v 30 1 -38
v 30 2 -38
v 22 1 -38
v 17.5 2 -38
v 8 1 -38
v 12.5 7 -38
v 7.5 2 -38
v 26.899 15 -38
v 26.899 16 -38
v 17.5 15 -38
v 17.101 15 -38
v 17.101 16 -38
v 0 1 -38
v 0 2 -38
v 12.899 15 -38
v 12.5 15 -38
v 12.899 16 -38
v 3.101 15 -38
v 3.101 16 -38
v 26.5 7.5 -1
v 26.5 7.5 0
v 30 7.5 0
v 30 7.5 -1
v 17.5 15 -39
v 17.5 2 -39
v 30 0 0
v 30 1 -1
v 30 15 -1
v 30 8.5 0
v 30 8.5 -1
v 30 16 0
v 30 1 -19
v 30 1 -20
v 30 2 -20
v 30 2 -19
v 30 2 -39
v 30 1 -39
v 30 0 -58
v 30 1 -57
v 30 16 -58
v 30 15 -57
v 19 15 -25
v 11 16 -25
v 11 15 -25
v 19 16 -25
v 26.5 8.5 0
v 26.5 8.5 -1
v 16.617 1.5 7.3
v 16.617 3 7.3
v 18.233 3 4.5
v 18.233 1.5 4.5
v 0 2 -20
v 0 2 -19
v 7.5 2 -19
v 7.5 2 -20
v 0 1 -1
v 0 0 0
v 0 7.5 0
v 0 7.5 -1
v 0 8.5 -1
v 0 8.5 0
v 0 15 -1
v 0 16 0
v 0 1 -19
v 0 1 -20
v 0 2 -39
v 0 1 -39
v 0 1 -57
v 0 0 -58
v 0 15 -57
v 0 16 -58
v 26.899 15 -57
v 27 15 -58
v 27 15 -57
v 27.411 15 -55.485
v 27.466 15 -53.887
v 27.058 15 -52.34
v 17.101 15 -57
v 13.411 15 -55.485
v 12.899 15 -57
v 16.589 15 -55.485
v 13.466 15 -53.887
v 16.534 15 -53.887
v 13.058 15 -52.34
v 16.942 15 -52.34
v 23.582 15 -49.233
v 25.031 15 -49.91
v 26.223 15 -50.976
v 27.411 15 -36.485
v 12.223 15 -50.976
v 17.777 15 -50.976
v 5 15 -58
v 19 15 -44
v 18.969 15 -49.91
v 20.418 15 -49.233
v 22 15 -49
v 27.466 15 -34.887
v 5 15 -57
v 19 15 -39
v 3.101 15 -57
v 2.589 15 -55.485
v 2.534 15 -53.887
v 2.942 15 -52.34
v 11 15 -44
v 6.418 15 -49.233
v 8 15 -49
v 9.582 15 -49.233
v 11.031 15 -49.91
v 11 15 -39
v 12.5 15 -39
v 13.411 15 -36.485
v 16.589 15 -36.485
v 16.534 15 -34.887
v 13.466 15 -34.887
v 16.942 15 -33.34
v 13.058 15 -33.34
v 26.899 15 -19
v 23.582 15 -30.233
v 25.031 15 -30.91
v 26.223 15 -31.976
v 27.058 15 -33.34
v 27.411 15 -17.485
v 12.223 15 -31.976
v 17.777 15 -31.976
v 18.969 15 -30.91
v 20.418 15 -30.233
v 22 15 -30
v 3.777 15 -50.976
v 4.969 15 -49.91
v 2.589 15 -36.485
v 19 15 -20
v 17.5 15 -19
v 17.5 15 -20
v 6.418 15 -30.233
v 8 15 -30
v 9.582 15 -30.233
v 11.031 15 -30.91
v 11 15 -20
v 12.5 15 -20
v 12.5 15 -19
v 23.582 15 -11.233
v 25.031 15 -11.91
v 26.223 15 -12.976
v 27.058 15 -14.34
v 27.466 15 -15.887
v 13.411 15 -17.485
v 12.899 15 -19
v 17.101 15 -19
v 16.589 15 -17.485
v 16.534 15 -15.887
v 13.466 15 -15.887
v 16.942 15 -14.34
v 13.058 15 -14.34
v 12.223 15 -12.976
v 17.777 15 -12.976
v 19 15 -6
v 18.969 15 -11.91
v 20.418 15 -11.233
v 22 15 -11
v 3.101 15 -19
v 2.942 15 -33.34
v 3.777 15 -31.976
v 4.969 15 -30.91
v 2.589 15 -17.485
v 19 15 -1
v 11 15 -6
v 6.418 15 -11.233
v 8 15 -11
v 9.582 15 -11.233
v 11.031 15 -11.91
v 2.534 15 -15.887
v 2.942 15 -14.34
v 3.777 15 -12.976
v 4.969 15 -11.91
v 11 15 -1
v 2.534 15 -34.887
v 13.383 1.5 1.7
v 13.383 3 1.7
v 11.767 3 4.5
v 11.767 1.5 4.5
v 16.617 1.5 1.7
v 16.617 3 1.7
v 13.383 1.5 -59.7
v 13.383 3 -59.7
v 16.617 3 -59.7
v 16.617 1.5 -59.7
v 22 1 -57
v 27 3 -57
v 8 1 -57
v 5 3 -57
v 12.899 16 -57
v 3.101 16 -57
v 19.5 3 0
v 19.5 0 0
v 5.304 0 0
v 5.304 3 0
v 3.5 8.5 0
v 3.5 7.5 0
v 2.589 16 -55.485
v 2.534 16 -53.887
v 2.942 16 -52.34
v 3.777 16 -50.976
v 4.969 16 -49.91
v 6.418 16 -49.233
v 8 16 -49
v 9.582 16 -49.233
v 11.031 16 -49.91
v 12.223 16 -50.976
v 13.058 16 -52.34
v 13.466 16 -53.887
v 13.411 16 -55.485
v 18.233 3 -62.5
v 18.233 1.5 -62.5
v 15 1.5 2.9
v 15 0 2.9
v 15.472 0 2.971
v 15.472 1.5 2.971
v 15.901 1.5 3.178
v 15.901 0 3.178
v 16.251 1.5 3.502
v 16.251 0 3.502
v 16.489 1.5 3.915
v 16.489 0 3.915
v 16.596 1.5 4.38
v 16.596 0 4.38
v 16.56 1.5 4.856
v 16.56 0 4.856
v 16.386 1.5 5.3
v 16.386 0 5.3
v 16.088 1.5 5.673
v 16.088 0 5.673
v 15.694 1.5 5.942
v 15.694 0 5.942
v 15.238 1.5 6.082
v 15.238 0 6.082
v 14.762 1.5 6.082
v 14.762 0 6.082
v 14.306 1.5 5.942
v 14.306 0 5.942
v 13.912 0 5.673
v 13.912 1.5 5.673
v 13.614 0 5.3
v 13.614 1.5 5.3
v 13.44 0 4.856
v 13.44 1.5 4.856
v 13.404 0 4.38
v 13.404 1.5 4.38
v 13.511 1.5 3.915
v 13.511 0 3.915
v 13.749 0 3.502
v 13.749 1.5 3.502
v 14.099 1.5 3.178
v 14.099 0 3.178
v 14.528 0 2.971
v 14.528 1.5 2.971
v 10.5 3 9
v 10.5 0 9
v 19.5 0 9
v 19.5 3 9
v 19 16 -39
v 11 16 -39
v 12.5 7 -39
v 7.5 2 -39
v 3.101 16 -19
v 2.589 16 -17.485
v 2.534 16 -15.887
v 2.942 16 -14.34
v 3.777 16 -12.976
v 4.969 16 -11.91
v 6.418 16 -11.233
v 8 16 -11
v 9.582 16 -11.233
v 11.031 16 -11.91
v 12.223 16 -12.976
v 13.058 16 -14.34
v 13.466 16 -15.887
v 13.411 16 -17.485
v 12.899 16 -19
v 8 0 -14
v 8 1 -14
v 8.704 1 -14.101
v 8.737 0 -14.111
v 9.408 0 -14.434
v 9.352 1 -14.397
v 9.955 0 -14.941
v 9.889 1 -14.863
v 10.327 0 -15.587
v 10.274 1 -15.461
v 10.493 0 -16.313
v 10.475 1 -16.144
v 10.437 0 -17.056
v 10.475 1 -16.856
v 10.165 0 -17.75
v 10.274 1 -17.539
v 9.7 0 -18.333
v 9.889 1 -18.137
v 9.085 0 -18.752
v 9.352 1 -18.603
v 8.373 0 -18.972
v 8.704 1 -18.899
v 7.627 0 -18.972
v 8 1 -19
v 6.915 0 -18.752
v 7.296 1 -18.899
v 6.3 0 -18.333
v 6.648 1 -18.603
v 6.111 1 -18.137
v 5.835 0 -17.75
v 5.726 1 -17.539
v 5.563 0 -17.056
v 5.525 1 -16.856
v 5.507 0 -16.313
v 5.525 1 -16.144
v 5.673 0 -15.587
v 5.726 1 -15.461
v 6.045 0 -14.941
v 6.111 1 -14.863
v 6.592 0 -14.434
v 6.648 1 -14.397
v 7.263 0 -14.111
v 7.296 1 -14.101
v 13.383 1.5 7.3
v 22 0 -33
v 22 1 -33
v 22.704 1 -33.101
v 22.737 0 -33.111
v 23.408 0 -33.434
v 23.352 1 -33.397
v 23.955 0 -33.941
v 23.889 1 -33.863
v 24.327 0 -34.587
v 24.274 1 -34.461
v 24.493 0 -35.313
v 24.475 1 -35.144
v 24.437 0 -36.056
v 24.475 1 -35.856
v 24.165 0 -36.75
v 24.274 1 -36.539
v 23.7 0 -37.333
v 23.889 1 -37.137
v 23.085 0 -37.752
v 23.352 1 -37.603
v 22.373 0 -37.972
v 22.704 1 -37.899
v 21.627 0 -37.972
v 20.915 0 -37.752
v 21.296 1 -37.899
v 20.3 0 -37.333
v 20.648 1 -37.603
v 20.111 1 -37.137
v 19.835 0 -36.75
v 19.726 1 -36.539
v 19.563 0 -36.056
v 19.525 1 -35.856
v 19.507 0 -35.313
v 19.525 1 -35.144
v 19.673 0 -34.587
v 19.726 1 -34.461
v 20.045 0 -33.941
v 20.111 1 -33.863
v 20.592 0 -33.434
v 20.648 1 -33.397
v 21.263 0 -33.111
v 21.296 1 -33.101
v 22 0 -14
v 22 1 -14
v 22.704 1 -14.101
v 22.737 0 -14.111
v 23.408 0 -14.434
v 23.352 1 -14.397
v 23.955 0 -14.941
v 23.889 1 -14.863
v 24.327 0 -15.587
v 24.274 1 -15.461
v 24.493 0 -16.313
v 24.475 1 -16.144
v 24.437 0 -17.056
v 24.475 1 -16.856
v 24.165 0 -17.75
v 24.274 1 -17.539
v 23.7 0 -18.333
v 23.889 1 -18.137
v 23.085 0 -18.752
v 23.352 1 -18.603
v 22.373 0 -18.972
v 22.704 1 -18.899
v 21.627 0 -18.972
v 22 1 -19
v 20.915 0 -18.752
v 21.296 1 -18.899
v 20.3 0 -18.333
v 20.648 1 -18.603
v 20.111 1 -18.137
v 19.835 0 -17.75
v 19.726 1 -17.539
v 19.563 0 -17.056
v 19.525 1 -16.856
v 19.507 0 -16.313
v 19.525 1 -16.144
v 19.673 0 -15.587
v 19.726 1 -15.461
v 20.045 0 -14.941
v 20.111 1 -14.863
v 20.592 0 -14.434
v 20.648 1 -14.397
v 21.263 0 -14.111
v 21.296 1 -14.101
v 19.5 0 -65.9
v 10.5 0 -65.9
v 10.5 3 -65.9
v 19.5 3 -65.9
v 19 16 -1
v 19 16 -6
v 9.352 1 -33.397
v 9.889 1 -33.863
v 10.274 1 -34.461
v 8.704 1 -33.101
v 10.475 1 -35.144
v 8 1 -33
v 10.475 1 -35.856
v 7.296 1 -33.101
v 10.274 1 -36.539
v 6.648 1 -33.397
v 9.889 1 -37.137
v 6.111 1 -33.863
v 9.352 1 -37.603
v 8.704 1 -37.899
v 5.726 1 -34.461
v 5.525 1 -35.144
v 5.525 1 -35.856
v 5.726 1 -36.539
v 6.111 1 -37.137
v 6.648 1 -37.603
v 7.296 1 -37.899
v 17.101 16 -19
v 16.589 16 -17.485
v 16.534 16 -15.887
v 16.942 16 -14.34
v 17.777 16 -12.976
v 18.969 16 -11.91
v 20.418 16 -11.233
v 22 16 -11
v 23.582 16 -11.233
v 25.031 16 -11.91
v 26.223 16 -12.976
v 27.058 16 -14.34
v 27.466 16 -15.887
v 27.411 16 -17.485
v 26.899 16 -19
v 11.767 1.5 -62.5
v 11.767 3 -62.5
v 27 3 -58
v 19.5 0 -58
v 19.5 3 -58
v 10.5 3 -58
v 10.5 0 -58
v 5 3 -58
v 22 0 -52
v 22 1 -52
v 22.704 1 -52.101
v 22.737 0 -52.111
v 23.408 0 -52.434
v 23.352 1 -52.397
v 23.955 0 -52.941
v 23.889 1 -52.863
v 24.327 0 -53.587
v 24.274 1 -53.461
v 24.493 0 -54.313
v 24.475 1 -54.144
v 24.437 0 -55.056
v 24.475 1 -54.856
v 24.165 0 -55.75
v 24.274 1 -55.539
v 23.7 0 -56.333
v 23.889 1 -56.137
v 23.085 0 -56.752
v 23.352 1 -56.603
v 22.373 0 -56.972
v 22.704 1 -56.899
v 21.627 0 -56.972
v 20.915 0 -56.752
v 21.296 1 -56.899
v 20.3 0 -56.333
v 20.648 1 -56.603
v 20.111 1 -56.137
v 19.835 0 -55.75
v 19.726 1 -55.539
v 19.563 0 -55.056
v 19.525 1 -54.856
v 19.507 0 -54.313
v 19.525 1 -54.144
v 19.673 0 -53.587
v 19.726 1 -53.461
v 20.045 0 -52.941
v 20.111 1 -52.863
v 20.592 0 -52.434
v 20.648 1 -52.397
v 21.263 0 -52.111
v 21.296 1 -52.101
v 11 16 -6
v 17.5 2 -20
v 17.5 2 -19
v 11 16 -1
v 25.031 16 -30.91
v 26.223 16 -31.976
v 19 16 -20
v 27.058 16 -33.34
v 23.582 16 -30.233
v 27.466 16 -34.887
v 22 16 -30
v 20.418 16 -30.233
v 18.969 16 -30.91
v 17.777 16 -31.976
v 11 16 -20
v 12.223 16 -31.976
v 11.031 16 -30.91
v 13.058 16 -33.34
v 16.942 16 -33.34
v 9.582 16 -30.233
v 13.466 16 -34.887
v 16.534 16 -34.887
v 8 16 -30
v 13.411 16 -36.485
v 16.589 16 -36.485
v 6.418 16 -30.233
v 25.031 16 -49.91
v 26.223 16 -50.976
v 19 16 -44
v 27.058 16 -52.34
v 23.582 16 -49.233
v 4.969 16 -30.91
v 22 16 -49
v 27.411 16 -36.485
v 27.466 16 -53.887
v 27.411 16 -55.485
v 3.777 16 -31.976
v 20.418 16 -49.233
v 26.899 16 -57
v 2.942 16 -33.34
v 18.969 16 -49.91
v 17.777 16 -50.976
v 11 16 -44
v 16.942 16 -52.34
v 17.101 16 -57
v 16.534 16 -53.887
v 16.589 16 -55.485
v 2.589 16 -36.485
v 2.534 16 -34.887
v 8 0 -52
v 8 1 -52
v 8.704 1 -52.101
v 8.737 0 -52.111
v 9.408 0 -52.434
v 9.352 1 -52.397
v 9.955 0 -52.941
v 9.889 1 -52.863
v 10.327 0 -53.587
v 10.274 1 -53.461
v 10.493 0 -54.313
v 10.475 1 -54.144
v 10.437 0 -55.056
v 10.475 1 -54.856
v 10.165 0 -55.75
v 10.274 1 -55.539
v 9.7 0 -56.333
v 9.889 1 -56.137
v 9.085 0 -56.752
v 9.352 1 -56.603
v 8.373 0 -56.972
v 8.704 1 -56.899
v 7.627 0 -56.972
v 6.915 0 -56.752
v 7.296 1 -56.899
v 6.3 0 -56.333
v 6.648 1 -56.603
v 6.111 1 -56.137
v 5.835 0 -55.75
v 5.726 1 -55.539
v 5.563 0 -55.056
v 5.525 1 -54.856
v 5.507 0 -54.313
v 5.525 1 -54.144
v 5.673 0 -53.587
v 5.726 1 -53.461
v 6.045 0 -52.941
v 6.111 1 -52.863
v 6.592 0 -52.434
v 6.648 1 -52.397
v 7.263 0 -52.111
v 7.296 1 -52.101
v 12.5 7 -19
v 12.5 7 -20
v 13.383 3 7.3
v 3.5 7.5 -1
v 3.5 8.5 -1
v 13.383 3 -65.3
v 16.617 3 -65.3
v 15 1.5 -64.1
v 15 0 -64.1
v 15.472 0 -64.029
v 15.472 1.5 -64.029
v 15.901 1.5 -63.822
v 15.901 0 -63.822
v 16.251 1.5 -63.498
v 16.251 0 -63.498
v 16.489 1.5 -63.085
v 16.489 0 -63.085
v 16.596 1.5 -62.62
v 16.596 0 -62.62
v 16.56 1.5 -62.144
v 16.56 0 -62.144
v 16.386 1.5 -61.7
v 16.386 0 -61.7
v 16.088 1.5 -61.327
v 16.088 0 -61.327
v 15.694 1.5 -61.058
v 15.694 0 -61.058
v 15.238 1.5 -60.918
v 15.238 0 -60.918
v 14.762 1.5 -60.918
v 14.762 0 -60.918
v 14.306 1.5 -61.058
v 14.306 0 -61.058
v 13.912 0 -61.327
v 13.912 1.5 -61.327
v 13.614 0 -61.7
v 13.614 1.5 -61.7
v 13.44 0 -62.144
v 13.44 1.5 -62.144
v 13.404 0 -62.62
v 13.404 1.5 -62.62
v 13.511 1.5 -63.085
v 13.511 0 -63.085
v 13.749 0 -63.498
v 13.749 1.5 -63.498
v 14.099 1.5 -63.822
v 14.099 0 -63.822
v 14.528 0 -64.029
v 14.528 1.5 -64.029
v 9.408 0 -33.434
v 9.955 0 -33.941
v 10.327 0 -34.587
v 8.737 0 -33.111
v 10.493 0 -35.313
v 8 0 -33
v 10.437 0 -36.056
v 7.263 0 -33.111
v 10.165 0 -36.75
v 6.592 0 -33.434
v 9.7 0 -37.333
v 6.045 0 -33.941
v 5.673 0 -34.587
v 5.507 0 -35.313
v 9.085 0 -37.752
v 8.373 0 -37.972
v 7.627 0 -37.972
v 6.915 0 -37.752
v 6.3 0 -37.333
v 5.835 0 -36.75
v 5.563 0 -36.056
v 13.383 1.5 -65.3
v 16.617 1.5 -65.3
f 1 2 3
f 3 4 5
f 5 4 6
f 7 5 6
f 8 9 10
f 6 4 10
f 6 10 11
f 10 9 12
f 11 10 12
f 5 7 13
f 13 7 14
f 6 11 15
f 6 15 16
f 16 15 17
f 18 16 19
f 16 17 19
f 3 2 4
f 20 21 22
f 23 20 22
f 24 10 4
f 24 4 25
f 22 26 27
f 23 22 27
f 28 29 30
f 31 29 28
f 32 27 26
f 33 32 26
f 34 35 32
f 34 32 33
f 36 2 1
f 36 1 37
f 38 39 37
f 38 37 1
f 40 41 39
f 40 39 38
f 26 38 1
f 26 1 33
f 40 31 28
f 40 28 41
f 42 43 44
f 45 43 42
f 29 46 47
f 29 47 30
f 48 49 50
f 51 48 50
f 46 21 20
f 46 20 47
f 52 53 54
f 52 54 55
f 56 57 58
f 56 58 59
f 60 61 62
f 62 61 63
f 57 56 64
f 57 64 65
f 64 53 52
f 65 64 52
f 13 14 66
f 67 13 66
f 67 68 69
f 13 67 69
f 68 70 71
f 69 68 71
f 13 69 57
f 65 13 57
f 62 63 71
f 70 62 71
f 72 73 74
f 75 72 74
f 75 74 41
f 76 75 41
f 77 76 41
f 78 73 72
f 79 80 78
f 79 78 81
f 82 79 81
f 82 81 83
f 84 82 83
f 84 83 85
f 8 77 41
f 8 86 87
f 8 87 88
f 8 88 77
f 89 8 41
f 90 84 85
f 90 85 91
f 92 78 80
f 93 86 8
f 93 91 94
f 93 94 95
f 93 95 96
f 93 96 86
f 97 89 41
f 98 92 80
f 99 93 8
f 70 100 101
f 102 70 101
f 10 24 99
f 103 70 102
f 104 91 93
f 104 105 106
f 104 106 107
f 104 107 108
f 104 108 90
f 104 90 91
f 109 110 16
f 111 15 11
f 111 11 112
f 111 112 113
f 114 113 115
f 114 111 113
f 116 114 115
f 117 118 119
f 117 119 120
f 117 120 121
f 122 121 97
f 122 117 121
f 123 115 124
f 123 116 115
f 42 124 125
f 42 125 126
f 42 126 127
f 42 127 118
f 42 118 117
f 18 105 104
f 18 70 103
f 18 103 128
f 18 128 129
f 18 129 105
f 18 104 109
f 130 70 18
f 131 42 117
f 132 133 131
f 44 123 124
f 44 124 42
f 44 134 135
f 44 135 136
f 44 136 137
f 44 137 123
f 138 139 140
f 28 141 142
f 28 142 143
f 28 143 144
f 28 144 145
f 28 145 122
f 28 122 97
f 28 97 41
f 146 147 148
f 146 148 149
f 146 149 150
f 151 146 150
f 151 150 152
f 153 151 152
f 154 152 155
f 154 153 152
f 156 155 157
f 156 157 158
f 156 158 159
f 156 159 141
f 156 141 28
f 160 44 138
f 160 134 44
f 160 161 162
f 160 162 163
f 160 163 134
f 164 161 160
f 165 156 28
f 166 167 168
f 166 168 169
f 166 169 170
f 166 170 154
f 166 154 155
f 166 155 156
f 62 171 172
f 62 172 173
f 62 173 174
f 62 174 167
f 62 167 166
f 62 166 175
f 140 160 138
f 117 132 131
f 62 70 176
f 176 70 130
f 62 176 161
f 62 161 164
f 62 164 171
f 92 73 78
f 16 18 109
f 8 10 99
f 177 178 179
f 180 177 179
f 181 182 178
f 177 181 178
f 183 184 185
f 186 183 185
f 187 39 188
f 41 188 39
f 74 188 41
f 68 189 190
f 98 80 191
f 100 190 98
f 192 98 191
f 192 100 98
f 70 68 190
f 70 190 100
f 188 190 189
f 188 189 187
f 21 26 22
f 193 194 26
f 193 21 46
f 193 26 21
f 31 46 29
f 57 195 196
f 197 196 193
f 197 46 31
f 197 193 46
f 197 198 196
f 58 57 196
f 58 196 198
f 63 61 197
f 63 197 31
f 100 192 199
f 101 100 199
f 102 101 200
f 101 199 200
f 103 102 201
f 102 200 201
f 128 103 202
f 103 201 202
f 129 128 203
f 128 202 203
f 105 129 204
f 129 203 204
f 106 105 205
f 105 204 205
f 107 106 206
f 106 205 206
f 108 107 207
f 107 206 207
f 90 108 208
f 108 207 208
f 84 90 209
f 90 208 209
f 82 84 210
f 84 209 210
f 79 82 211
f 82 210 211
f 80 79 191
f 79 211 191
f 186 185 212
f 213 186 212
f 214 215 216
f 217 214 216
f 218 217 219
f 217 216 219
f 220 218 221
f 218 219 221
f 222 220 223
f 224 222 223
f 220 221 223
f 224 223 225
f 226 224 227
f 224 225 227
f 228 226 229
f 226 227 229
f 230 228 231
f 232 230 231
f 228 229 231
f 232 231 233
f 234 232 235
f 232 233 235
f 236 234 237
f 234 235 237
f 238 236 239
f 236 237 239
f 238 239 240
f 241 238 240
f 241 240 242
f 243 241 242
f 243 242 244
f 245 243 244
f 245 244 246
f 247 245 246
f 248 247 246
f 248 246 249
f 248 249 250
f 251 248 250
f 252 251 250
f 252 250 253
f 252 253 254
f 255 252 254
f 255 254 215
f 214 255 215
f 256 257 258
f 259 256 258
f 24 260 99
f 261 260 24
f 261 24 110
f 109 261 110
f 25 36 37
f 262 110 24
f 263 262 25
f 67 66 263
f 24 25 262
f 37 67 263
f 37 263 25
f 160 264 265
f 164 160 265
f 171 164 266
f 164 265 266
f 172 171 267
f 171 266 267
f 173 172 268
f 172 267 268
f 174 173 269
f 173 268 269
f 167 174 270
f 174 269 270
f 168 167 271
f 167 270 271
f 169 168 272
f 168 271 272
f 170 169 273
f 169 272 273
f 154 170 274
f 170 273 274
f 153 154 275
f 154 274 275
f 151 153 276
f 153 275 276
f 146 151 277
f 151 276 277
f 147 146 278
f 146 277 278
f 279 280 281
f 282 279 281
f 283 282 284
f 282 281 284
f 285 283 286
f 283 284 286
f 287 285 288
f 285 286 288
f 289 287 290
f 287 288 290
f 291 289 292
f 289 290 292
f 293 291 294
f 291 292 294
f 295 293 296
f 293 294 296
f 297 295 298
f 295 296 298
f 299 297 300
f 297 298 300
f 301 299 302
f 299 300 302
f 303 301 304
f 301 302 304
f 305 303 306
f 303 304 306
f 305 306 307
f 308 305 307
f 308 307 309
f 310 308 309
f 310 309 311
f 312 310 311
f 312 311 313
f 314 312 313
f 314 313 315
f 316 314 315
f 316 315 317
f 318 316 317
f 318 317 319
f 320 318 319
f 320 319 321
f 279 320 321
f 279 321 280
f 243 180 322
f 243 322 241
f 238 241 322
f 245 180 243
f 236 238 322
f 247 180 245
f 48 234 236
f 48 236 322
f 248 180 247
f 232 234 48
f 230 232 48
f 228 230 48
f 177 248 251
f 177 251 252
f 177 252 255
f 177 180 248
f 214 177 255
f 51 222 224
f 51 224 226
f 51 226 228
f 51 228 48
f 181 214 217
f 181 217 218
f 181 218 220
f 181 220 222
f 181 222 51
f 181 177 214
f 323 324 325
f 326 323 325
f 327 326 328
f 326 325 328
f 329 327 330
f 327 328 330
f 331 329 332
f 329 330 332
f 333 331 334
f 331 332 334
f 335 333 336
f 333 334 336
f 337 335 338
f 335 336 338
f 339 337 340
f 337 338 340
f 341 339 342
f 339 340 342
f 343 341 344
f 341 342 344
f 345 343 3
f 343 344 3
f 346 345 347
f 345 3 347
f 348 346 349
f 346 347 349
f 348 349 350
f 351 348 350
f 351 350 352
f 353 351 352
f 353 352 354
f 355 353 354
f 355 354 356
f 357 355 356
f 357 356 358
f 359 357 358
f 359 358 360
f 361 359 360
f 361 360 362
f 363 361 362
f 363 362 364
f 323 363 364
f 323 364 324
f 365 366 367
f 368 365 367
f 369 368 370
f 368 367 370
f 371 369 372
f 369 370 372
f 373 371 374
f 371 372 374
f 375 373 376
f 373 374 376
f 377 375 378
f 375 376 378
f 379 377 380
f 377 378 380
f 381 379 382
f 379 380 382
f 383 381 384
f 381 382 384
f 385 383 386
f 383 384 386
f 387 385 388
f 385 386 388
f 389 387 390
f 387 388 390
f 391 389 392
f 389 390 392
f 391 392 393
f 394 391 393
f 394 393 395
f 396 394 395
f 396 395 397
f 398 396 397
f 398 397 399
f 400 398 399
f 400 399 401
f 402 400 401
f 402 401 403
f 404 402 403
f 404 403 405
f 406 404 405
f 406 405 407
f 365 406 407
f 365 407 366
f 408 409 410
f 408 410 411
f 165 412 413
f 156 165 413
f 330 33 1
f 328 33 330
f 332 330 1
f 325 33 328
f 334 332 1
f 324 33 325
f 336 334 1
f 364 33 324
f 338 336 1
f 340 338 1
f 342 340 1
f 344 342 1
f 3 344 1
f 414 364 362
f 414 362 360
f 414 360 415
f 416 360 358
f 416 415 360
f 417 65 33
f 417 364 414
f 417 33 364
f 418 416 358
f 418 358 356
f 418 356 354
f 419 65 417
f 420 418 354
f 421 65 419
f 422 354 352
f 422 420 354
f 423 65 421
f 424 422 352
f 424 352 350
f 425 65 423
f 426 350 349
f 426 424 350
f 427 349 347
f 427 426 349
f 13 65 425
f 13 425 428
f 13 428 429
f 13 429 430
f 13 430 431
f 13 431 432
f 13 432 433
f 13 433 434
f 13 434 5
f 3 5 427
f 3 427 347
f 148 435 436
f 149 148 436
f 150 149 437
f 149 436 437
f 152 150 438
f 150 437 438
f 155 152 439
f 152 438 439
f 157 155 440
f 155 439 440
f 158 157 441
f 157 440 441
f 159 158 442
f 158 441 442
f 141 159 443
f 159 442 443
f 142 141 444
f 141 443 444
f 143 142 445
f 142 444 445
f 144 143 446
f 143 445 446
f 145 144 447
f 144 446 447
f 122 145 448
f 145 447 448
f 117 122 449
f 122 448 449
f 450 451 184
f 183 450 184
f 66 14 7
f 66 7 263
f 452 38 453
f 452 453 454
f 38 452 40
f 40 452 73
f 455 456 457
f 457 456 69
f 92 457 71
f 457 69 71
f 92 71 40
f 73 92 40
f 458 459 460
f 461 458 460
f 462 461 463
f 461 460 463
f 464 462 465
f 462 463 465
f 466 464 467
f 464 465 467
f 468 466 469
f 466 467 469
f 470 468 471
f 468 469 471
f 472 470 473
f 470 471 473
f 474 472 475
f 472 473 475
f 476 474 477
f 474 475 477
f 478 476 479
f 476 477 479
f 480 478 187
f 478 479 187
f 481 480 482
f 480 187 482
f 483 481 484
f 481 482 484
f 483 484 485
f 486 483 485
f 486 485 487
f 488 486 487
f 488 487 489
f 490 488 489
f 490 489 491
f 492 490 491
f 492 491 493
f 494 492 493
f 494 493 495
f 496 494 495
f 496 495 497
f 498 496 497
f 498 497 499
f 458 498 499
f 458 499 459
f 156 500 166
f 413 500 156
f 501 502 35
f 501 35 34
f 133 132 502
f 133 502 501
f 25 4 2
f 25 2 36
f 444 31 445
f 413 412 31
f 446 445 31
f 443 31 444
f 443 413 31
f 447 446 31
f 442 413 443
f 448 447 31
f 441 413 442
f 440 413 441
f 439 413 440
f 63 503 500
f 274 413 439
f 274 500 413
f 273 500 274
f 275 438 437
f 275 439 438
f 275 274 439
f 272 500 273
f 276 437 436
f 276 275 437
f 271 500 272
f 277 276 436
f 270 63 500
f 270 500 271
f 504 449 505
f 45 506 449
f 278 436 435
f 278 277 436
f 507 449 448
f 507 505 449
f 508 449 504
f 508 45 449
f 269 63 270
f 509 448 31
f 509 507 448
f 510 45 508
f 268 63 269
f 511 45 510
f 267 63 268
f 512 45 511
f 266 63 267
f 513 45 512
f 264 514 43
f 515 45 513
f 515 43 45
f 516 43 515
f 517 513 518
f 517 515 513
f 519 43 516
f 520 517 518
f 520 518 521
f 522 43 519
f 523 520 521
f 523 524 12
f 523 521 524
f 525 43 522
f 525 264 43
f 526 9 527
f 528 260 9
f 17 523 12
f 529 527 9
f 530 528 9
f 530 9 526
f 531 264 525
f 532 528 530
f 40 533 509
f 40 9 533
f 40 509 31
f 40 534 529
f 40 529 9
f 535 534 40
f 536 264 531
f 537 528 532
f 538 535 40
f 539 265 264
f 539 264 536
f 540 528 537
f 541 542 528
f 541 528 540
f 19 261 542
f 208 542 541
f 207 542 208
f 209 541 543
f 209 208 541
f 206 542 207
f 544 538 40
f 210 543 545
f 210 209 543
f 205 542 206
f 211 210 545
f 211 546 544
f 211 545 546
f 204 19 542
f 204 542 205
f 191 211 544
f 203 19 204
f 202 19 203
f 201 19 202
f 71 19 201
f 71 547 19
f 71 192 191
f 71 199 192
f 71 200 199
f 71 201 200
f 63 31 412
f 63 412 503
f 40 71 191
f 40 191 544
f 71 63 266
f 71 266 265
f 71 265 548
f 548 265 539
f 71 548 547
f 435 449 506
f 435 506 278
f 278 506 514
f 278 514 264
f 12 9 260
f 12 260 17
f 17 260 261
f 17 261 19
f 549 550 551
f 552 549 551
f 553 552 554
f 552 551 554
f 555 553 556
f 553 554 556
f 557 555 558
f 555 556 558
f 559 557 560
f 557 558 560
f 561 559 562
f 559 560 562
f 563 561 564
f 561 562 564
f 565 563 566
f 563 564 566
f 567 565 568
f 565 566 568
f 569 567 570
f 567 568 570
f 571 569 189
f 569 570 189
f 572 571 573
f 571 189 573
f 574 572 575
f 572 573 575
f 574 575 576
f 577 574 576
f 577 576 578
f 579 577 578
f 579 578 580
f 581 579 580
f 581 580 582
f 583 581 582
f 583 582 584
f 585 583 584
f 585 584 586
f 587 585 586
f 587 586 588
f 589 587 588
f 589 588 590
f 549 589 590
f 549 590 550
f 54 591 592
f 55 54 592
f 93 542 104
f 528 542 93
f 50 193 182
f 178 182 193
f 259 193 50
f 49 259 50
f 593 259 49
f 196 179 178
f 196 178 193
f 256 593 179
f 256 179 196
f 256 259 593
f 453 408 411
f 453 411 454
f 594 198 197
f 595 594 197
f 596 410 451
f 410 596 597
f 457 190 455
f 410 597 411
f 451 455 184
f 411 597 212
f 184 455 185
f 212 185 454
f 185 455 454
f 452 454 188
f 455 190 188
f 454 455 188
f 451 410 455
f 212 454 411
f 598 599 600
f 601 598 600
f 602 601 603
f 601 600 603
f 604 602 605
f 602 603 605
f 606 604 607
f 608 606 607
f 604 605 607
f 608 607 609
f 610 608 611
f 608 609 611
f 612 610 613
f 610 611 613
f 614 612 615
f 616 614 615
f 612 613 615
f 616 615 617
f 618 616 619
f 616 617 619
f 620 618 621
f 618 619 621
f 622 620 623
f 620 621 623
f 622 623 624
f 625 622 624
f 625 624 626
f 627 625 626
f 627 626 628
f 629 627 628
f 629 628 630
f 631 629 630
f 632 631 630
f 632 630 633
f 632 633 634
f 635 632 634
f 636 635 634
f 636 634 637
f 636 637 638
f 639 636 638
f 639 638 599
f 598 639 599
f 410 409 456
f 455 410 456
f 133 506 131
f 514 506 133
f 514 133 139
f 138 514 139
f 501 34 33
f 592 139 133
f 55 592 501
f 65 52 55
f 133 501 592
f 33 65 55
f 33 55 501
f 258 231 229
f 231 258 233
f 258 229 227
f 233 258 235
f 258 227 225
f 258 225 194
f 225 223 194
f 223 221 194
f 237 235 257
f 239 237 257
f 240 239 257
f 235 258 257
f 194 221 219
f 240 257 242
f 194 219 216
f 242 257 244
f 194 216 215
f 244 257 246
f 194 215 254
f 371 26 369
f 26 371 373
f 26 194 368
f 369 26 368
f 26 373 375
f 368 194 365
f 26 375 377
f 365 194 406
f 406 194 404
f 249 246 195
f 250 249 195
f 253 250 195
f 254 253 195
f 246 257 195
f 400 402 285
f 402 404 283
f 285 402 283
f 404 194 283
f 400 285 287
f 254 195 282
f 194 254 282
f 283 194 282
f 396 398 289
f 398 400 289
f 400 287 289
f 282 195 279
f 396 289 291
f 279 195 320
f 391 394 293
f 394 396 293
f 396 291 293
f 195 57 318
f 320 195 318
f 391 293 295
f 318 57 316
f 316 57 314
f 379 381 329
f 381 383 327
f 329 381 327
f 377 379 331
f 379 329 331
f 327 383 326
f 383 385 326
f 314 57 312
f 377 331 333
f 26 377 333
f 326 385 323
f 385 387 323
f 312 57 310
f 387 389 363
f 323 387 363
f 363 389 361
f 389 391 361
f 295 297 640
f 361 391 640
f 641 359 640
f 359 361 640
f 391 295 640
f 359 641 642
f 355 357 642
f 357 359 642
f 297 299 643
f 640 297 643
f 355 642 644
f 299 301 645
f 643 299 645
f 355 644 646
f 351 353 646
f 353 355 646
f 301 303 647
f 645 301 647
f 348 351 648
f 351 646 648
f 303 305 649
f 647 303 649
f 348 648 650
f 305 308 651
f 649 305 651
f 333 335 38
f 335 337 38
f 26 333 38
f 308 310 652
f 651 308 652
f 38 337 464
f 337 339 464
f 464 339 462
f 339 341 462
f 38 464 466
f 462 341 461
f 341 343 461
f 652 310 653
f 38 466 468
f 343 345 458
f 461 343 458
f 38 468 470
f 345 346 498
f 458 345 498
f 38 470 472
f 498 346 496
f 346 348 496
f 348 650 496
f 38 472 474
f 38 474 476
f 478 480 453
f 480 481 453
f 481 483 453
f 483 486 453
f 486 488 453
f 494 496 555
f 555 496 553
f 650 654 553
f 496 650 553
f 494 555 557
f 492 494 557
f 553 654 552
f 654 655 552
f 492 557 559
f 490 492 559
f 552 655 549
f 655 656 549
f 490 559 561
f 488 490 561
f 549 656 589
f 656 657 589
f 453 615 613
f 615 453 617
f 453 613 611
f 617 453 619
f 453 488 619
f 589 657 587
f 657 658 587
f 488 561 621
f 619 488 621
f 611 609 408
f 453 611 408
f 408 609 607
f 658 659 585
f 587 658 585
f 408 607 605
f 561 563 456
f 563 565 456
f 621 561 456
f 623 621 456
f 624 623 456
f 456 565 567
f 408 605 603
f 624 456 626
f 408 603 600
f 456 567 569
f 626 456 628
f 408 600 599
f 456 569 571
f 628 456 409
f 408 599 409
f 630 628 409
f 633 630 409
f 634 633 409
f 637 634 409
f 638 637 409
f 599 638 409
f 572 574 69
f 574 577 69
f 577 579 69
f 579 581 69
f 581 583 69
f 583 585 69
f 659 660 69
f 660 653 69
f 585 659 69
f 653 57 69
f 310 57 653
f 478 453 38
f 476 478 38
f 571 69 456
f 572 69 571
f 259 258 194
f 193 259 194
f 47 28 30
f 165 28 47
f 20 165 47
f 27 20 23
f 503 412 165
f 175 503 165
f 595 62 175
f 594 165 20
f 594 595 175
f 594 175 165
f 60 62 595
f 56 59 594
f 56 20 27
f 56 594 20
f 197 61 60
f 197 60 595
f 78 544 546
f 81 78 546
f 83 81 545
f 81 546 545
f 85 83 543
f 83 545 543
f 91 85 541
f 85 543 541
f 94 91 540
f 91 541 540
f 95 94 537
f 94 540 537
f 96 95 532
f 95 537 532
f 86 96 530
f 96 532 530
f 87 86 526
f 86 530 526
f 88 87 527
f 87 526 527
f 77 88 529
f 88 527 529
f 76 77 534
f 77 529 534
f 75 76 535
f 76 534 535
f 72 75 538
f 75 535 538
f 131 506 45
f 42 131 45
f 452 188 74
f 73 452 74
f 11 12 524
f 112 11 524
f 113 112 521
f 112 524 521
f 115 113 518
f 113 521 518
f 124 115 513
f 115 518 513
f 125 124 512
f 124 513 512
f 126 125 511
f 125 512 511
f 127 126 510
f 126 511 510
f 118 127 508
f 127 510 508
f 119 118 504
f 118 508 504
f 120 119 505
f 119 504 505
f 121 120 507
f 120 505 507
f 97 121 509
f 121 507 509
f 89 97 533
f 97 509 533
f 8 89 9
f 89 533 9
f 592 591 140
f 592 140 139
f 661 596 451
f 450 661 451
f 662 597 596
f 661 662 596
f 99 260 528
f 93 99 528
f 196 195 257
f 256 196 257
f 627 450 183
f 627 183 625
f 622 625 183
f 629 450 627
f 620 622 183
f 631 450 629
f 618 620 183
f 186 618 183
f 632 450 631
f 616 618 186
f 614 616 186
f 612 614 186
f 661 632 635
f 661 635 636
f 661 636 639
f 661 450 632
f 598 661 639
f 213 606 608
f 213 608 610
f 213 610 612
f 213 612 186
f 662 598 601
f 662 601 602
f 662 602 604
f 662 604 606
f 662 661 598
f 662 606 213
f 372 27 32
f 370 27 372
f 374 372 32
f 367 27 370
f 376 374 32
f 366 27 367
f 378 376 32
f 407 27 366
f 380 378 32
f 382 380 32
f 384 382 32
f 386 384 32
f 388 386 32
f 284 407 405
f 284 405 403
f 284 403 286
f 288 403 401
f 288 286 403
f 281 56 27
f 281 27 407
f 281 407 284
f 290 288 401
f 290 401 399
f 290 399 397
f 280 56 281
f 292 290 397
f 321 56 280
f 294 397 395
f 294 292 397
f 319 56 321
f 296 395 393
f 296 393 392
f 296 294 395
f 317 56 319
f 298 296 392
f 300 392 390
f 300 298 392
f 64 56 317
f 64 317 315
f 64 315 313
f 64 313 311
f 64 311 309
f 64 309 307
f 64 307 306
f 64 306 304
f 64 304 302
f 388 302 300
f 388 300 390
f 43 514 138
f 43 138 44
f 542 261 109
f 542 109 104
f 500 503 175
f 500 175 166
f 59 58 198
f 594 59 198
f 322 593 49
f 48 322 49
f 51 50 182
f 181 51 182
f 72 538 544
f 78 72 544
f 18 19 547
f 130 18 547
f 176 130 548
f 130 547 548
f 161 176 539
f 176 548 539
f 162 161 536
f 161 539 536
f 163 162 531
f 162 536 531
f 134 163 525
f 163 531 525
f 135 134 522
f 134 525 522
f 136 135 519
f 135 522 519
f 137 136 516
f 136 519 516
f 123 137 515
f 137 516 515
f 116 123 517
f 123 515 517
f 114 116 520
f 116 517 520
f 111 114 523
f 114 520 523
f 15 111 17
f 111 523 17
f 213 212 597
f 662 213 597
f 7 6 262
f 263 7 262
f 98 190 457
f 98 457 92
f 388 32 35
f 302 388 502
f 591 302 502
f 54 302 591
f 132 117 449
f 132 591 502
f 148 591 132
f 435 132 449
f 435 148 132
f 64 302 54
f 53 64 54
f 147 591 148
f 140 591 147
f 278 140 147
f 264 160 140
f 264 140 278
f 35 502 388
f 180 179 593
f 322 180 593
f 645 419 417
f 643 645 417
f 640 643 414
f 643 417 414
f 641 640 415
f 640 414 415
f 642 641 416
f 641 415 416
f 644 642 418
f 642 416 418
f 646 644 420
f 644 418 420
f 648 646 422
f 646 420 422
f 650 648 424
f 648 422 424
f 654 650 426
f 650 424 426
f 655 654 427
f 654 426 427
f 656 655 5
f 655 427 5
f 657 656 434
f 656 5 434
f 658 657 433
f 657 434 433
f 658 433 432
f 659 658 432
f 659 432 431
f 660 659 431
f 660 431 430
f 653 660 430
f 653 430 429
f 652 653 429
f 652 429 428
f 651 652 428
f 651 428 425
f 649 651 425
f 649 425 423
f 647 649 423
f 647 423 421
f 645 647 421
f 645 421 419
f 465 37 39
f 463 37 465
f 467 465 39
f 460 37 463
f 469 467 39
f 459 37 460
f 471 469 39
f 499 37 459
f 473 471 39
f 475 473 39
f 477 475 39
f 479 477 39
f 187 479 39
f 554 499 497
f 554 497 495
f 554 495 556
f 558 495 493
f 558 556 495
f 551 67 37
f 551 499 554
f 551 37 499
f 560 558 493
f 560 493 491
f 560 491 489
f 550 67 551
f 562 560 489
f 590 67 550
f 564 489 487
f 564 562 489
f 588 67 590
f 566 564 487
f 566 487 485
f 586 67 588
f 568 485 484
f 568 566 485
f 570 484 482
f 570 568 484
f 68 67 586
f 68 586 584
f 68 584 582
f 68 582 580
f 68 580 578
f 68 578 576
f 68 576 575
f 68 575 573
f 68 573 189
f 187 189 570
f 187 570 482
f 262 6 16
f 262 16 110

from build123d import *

# Parameters (mm, degrees)
SKETCH3_W           = 58
SKETCH3_H           = 16
BOSS_EXTRUDE2_DEPTH = 30
CUT_EXTRUDE2_REACH  = 3
SKETCH4_R           = 2.5
CUT_EXTRUDE6_REACH  = 3
SKETCH7_W           = 22
SKETCH7_H           = 12
BOSS_EXTRUDE4_REACH = 16
SKETCH9_W           = 5
SKETCH9_H           = 1
CHAMFER1_SIZE       = 5
SKETCH10_R          = 1.6
SKETCH10_W          = 9
SKETCH10_H          = 9
BOSS_EXTRUDE5_DEPTH = 3
CUT_EXTRUDE8_DEPTH  = 1.5
CUT_EXTRUDE9_REACH  = 69
SKETCH12_W          = 3.5
SKETCH12_H          = 1
CUT_EXTRUDE10_REACH = 18
SKETCH13_W          = 9
SKETCH13_H          = 1.1
CUT_EXTRUDE12_REACH = 18
SKETCH14_W          = 8
SKETCH14_H          = 5


with BuildPart() as part:
    # Sketch3 → Boss-Extrude2 (new body)
    with BuildSketch(Plane(origin=(0, 0, 0), x_dir=(0, 0, -1), z_dir=(1, 0, 0))):
        with Locations((29, 8)):
            Rectangle(SKETCH3_W, SKETCH3_H)
        Polygon((1, 1), (19, 1), (19, 2), (20, 2), (20, 1), (38, 1), (38, 2), (39, 2), (39, 1), (57, 1), (57, 15), (1, 15), align=None, mode=Mode.SUBTRACT)
    extrude(amount=BOSS_EXTRUDE2_DEPTH)

    # Sketch4 → Cut-Extrude2 (cut, up to next)
    with BuildSketch(Plane(origin=(0, 1, 0), x_dir=(1, 0, 0), z_dir=(0, 1, 0)), mode=Mode.PRIVATE) as cut_extrude2_sk1:
        with Locations(Location((22, 54.5, 0), (0, 0, 270))):  # turned: the seam where the file's is
            Circle(SKETCH4_R)
    cut_extrude2_tool1 = extrude(cut_extrude2_sk1.sketch, amount=-CUT_EXTRUDE2_REACH, mode=Mode.PRIVATE) & part.part
    add(cut_extrude2_tool1.solids().sort_by_distance((22, 1, -54.5))[0], mode=Mode.SUBTRACT)
    # Sketch4 → Cut-Extrude2 (cut, up to next)
    with BuildSketch(Plane(origin=(0, 1, 0), x_dir=(1, 0, 0), z_dir=(0, 1, 0)), mode=Mode.PRIVATE) as cut_extrude2_sk2:
        with Locations(Location((8, 54.5, 0), (0, 0, 270))):  # turned: the seam where the file's is
            Circle(SKETCH4_R)
    cut_extrude2_tool2 = extrude(cut_extrude2_sk2.sketch, amount=-CUT_EXTRUDE2_REACH, mode=Mode.PRIVATE) & part.part
    add(cut_extrude2_tool2.solids().sort_by_distance((8, 1, -54.5))[0], mode=Mode.SUBTRACT)
    # Sketch4 → Cut-Extrude2 (cut, up to next)
    with BuildSketch(Plane(origin=(0, 1, 0), x_dir=(1, 0, 0), z_dir=(0, 1, 0)), mode=Mode.PRIVATE) as cut_extrude2_sk3:
        with Locations(Location((8, 35.5, 0), (0, 0, 270))):  # turned: the seam where the file's is
            Circle(SKETCH4_R)
    cut_extrude2_tool3 = extrude(cut_extrude2_sk3.sketch, amount=-CUT_EXTRUDE2_REACH, mode=Mode.PRIVATE) & part.part
    add(cut_extrude2_tool3.solids().sort_by_distance((8, 1, -35.5))[0], mode=Mode.SUBTRACT)
    # Sketch4 → Cut-Extrude2 (cut, up to next)
    with BuildSketch(Plane(origin=(0, 1, 0), x_dir=(1, 0, 0), z_dir=(0, 1, 0)), mode=Mode.PRIVATE) as cut_extrude2_sk4:
        with Locations(Location((22, 35.5, 0), (0, 0, 270))):  # turned: the seam where the file's is
            Circle(SKETCH4_R)
    cut_extrude2_tool4 = extrude(cut_extrude2_sk4.sketch, amount=-CUT_EXTRUDE2_REACH, mode=Mode.PRIVATE) & part.part
    add(cut_extrude2_tool4.solids().sort_by_distance((22, 1, -35.5))[0], mode=Mode.SUBTRACT)
    # Sketch4 → Cut-Extrude2 (cut, up to next)
    with BuildSketch(Plane(origin=(0, 1, 0), x_dir=(1, 0, 0), z_dir=(0, 1, 0)), mode=Mode.PRIVATE) as cut_extrude2_sk5:
        with Locations(Location((8, 16.5, 0), (0, 0, 270))):  # turned: the seam where the file's is
            Circle(SKETCH4_R)
    cut_extrude2_tool5 = extrude(cut_extrude2_sk5.sketch, amount=-CUT_EXTRUDE2_REACH, mode=Mode.PRIVATE) & part.part
    add(cut_extrude2_tool5.solids().sort_by_distance((8, 1, -16.5))[0], mode=Mode.SUBTRACT)
    # Sketch4 → Cut-Extrude2 (cut, up to next)
    with BuildSketch(Plane(origin=(0, 1, 0), x_dir=(1, 0, 0), z_dir=(0, 1, 0)), mode=Mode.PRIVATE) as cut_extrude2_sk6:
        with Locations(Location((22, 16.5, 0), (0, 0, 270))):  # turned: the seam where the file's is
            Circle(SKETCH4_R)
    cut_extrude2_tool6 = extrude(cut_extrude2_sk6.sketch, amount=-CUT_EXTRUDE2_REACH, mode=Mode.PRIVATE) & part.part
    add(cut_extrude2_tool6.solids().sort_by_distance((22, 1, -16.5))[0], mode=Mode.SUBTRACT)

    # Sketch7 → Cut-Extrude6 (cut, up to next)
    with BuildSketch(Plane.XY.offset(-57), mode=Mode.PRIVATE) as cut_extrude6_sk1:
        with Locations((16, 9)):
            Rectangle(SKETCH7_W, SKETCH7_H)
    cut_extrude6_tool1 = extrude(cut_extrude6_sk1.sketch, amount=-CUT_EXTRUDE6_REACH, mode=Mode.PRIVATE) & part.part
    add(cut_extrude6_tool1.solids().sort_by_distance((16, 9, -57))[0], mode=Mode.SUBTRACT)

    # Sketch9 → Boss-Extrude4 (add, up to next)
    with BuildSketch(Plane(origin=(0, 2, 0), x_dir=(1, 0, 0), z_dir=(0, 1, 0)), mode=Mode.PRIVATE) as boss_extrude4_sk1:
        with Locations((15, 19.5)):
            Rectangle(SKETCH9_W, SKETCH9_H)
    boss_extrude4_tool1 = extrude(boss_extrude4_sk1.sketch, amount=BOSS_EXTRUDE4_REACH, mode=Mode.PRIVATE) - part.part
    add(boss_extrude4_tool1.solids().sort_by_distance((15, 2, -19.5))[0])
    # Sketch9 → Boss-Extrude4 (add, up to next)
    with BuildSketch(Plane(origin=(0, 2, 0), x_dir=(1, 0, 0), z_dir=(0, 1, 0)), mode=Mode.PRIVATE) as boss_extrude4_sk2:
        with Locations((15, 38.5)):
            Rectangle(SKETCH9_W, SKETCH9_H)
    boss_extrude4_tool2 = extrude(boss_extrude4_sk2.sketch, amount=BOSS_EXTRUDE4_REACH, mode=Mode.PRIVATE) - part.part
    add(boss_extrude4_tool2.solids().sort_by_distance((15, 2, -38.5))[0])

    # Chamfer1
    chamfer1_edges = [part.edges().sort_by_distance(p)[0] for p in [
        (12.5, 2, -19.5),
        (12.5, 2, -38.5),
    ]]
    chamfer(chamfer1_edges, length=CHAMFER1_SIZE)

    # Sketch10 → Boss-Extrude5 (add)
    with BuildSketch(Plane.XZ):
        Polygon((19.5, 0), (5.303847577, 0), (10.5, 9), (19.5, 9), align=None)
        with Locations(Location((15, 4.5, 0), (0, 0, 270))):  # turned: the seam where the file's is
            Circle(SKETCH10_R, mode=Mode.SUBTRACT)
        with Locations((15, -62.5)):
            Rectangle(SKETCH10_W, SKETCH10_H)
        with Locations(Location((15, -62.5, 0), (0, 0, 270))):  # turned: the seam where the file's is
            Circle(SKETCH10_R, mode=Mode.SUBTRACT)
    extrude(amount=-BOSS_EXTRUDE5_DEPTH)

    # Sketch11 → Cut-Extrude8 (cut)
    with BuildSketch(Plane(origin=(0, 3, 0), x_dir=(1, 0, 0), z_dir=(0, 1, 0))):
        Polygon((11.766838493, 62.5), (13.383419246, 59.7), (16.616580754, 59.7), (18.233161507, 62.5), (16.616580754, 65.3), (13.383419246, 65.3), align=None)
        Polygon((11.766838493, -4.5), (13.383419246, -7.3), (16.616580754, -7.3), (18.233161507, -4.5), (16.616580754, -1.7), (13.383419246, -1.7), align=None)
    extrude(amount=-CUT_EXTRUDE8_DEPTH, mode=Mode.SUBTRACT)

    # Sketch12 → Cut-Extrude9 (cut, up to next)
    with BuildSketch(Plane.XY, mode=Mode.PRIVATE) as cut_extrude9_sk1:
        with Locations((1.75, 8)):
            Rectangle(SKETCH12_W, SKETCH12_H)
    cut_extrude9_tool1 = extrude(cut_extrude9_sk1.sketch, amount=-CUT_EXTRUDE9_REACH, mode=Mode.PRIVATE) & part.part
    add(cut_extrude9_tool1.solids().sort_by_distance((1.75, 8, 0))[0], mode=Mode.SUBTRACT)
    # Sketch12 → Cut-Extrude9 (cut, up to next)
    with BuildSketch(Plane.XY, mode=Mode.PRIVATE) as cut_extrude9_sk2:
        with Locations((28.25, 8)):
            Rectangle(SKETCH12_W, SKETCH12_H)
    cut_extrude9_tool2 = extrude(cut_extrude9_sk2.sketch, amount=-CUT_EXTRUDE9_REACH, mode=Mode.PRIVATE) & part.part
    add(cut_extrude9_tool2.solids().sort_by_distance((28.25, 8, 0))[0], mode=Mode.SUBTRACT)

    # Sketch13 → Cut-Extrude10 (cut, up to next)
    with BuildSketch(Plane.XZ, mode=Mode.PRIVATE) as cut_extrude10_sk1:
        with Locations((15, -66.45)):
            Rectangle(SKETCH13_W, SKETCH13_H)
    cut_extrude10_tool1 = extrude(cut_extrude10_sk1.sketch, amount=-CUT_EXTRUDE10_REACH, mode=Mode.PRIVATE) & part.part
    add(cut_extrude10_tool1.solids().sort_by_distance((15, 0, -66.45))[0], mode=Mode.SUBTRACT)

    # Sketch14 → Cut-Extrude12 (cut, up to next)
    with BuildSketch(Plane(origin=(0, 16, 0), x_dir=(1, 0, 0), z_dir=(0, 1, 0)), mode=Mode.PRIVATE) as cut_extrude12_sk1:
        with BuildLine():
            Line((12.898979486, 57), (3.101020514, 57))
            ThreePointArc((3.101020514, 57), (8, 49), (12.898979486, 57))
        make_face()
    cut_extrude12_tool1 = extrude(cut_extrude12_sk1.sketch, amount=-CUT_EXTRUDE12_REACH, mode=Mode.PRIVATE) & part.part
    add(cut_extrude12_tool1.solids().sort_by_distance((8, 16, -53.441303))[0], mode=Mode.SUBTRACT)
    # Sketch14 → Cut-Extrude12 (cut, up to next)
    with BuildSketch(Plane(origin=(0, 16, 0), x_dir=(1, 0, 0), z_dir=(0, 1, 0)), mode=Mode.PRIVATE) as cut_extrude12_sk2:
        with BuildLine():
            Line((26.898979486, 57), (17.101020514, 57))
            ThreePointArc((17.101020514, 57), (22, 49), (26.898979486, 57))
        make_face()
    cut_extrude12_tool2 = extrude(cut_extrude12_sk2.sketch, amount=-CUT_EXTRUDE12_REACH, mode=Mode.PRIVATE) & part.part
    add(cut_extrude12_tool2.solids().sort_by_distance((22, 16, -53.441303))[0], mode=Mode.SUBTRACT)
    # Sketch14 → Cut-Extrude12 (cut, up to next)
    with BuildSketch(Plane(origin=(0, 16, 0), x_dir=(1, 0, 0), z_dir=(0, 1, 0)), mode=Mode.PRIVATE) as cut_extrude12_sk3:
        with BuildLine():
            Line((26.898979486, 38), (17.101020514, 38))
            ThreePointArc((17.101020514, 38), (22, 30), (26.898979486, 38))
        make_face()
    cut_extrude12_tool3 = extrude(cut_extrude12_sk3.sketch, amount=-CUT_EXTRUDE12_REACH, mode=Mode.PRIVATE) & part.part
    add(cut_extrude12_tool3.solids().sort_by_distance((22, 16, -34.441303))[0], mode=Mode.SUBTRACT)
    # Sketch14 → Cut-Extrude12 (cut, up to next)
    with BuildSketch(Plane(origin=(0, 16, 0), x_dir=(1, 0, 0), z_dir=(0, 1, 0)), mode=Mode.PRIVATE) as cut_extrude12_sk4:
        with BuildLine():
            Line((12.898979486, 38), (3.101020514, 38))
            ThreePointArc((3.101020514, 38), (8, 30), (12.898979486, 38))
        make_face()
    cut_extrude12_tool4 = extrude(cut_extrude12_sk4.sketch, amount=-CUT_EXTRUDE12_REACH, mode=Mode.PRIVATE) & part.part
    add(cut_extrude12_tool4.solids().sort_by_distance((8, 16, -34.441303))[0], mode=Mode.SUBTRACT)
    # Sketch14 → Cut-Extrude12 (cut, up to next)
    with BuildSketch(Plane(origin=(0, 16, 0), x_dir=(1, 0, 0), z_dir=(0, 1, 0)), mode=Mode.PRIVATE) as cut_extrude12_sk5:
        with BuildLine():
            Line((26.898979486, 19), (17.101020514, 19))
            ThreePointArc((17.101020514, 19), (22, 11), (26.898979486, 19))
        make_face()
    cut_extrude12_tool5 = extrude(cut_extrude12_sk5.sketch, amount=-CUT_EXTRUDE12_REACH, mode=Mode.PRIVATE) & part.part
    add(cut_extrude12_tool5.solids().sort_by_distance((22, 16, -15.441303))[0], mode=Mode.SUBTRACT)
    # Sketch14 → Cut-Extrude12 (cut, up to next)
    with BuildSketch(Plane(origin=(0, 16, 0), x_dir=(1, 0, 0), z_dir=(0, 1, 0)), mode=Mode.PRIVATE) as cut_extrude12_sk6:
        with BuildLine():
            Line((12.898979486, 19), (3.101020514, 19))
            ThreePointArc((3.101020514, 19), (8, 11), (12.898979486, 19))
        make_face()
    cut_extrude12_tool6 = extrude(cut_extrude12_sk6.sketch, amount=-CUT_EXTRUDE12_REACH, mode=Mode.PRIVATE) & part.part
    add(cut_extrude12_tool6.solids().sort_by_distance((8, 16, -15.441303))[0], mode=Mode.SUBTRACT)
    # Sketch14 → Cut-Extrude12 (cut, up to next)
    with BuildSketch(Plane(origin=(0, 16, 0), x_dir=(1, 0, 0), z_dir=(0, 1, 0)), mode=Mode.PRIVATE) as cut_extrude12_sk7:
        with Locations((15, 41.5)):
            Rectangle(SKETCH14_W, SKETCH14_H)
    cut_extrude12_tool7 = extrude(cut_extrude12_sk7.sketch, amount=-CUT_EXTRUDE12_REACH, mode=Mode.PRIVATE) & part.part
    add(cut_extrude12_tool7.solids().sort_by_distance((15, 16, -41.5))[0], mode=Mode.SUBTRACT)
    # Sketch14 → Cut-Extrude12 (cut, up to next)
    with BuildSketch(Plane(origin=(0, 16, 0), x_dir=(1, 0, 0), z_dir=(0, 1, 0)), mode=Mode.PRIVATE) as cut_extrude12_sk8:
        with Locations((15, 22.5)):
            Rectangle(SKETCH14_W, SKETCH14_H)
    cut_extrude12_tool8 = extrude(cut_extrude12_sk8.sketch, amount=-CUT_EXTRUDE12_REACH, mode=Mode.PRIVATE) & part.part
    add(cut_extrude12_tool8.solids().sort_by_distance((15, 16, -22.5))[0], mode=Mode.SUBTRACT)
    # Sketch14 → Cut-Extrude12 (cut, up to next)
    with BuildSketch(Plane(origin=(0, 16, 0), x_dir=(1, 0, 0), z_dir=(0, 1, 0)), mode=Mode.PRIVATE) as cut_extrude12_sk9:
        with Locations((15, 3.5)):
            Rectangle(SKETCH14_W, SKETCH14_H)
    cut_extrude12_tool9 = extrude(cut_extrude12_sk9.sketch, amount=-CUT_EXTRUDE12_REACH, mode=Mode.PRIVATE) & part.part
    add(cut_extrude12_tool9.solids().sort_by_distance((15, 16, -3.5))[0], mode=Mode.SUBTRACT)


solid = part.part
